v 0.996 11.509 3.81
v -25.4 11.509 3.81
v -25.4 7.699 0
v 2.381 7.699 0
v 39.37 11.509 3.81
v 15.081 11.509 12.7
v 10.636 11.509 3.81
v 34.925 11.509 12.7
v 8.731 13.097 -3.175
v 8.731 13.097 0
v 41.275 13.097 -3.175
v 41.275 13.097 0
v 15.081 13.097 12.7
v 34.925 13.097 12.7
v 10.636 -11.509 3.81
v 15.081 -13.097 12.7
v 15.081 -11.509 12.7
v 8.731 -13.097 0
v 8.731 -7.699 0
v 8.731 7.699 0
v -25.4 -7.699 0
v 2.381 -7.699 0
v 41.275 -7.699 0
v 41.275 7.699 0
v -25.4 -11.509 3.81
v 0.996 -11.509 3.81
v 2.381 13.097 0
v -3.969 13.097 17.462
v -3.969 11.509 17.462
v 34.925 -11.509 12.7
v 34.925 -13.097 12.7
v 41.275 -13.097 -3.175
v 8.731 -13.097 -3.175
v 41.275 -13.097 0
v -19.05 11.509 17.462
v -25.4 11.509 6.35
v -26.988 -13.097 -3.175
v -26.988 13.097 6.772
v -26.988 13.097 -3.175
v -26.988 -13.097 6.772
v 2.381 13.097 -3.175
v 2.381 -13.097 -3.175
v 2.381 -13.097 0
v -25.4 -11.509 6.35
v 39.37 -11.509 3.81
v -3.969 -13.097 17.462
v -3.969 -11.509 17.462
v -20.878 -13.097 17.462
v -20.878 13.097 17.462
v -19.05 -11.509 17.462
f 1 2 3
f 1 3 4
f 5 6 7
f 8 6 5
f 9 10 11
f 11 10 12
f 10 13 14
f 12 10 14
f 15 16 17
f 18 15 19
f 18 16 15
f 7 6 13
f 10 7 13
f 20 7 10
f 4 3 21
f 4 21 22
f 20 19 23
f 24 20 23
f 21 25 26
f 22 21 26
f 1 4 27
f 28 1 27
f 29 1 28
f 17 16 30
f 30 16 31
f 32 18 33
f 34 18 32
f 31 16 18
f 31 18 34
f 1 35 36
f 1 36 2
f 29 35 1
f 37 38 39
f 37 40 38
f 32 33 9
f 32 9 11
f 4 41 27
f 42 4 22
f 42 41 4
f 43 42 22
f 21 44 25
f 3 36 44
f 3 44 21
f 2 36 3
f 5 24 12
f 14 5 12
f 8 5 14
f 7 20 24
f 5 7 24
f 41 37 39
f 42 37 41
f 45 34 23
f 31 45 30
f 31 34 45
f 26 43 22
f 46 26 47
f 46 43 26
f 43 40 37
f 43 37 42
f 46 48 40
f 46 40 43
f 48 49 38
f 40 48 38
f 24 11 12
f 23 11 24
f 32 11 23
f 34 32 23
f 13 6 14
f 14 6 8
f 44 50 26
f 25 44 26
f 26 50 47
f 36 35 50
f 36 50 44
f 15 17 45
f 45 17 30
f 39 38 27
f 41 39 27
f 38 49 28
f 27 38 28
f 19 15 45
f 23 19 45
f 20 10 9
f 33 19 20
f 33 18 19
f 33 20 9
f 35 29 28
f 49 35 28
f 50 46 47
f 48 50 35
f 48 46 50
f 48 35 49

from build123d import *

# Parameters (mm, degrees)
F0_W      = 15.08125
F0_H      = 17.4625
F1_DEPTH  = 13.096875
F0_W_2    = 19.84375
F0_H_2    = 12.7
F2_DEPTH  = 11.509375
F3_SIZE   = 3.81
F3_2_SIZE = 3.81


# Not quite as in the source:
# - a feature names something its author has since deleted; it is built from what else it names


with BuildPart() as f1:
    # F0 (on Front) → F1 (new body, symmetric)
    with BuildSketch(Plane.XZ):
        Polygon((-25.4000246501, 0), (-19.0500246501, 0), (-19.0500246501, 17.4625), (-25.4000246501, 6.35), align=None)
        Polygon((-3.9687746501, 0), (2.3812253499, 0), (-3.9687746501, 17.4625), align=None)
        Polygon((-26.9875246501, -3.175), (-25.4000246501, -3.175), (-25.4000246501, 0), (-25.4000246501, 6.35), (-19.0500246501, 17.4625), (-20.8784295323, 17.4625), (-26.9875246501, 6.7715835439), (-26.9875246501, 6.35), align=None)
        with Locations((-11.5093996501, 8.73125)):
            Rectangle(F0_W, F0_H)
        Polygon((2.3812253499, -3.175), (2.3812253499, 0), (-3.9687746501, 0), (-19.0500246501, 0), (-25.4000246501, 0), (-25.4000246501, -3.175), align=None)
    extrude(amount=F1_DEPTH, both=True)


with BuildPart() as f1b:
    # F0 (on Front) → F1, piece 2 (new body, symmetric)
    with BuildSketch(Plane.XZ):
        Polygon((8.7312253499, 0), (15.0812253499, 0), (15.0812253499, 12.7), align=None)
        Polygon((34.9249753499, 0), (41.2749753499, 0), (34.9249753499, 12.7), align=None)
        Polygon((41.2749753499, -3.175), (41.2749753499, 0), (34.9249753499, 0), (15.0812253499, 0), (8.7312253499, 0), (8.7312253499, -3.175), align=None)
        with Locations((25.0031003499, 6.35)):
            Rectangle(F0_W_2, F0_H_2)
    extrude(amount=F1_DEPTH, both=True)


with BuildPart() as f2_tool:
    # F0 (on Front) → F2 (new body, symmetric)
    with BuildSketch(Plane.XZ):
        Polygon((-25.4000246501, 0), (-19.0500246501, 0), (-19.0500246501, 17.4625), (-25.4000246501, 6.35), align=None)
        with Locations((-11.5093996501, 8.73125)):
            Rectangle(F0_W, F0_H)
        Polygon((-3.9687746501, 0), (2.3812253499, 0), (-3.9687746501, 17.4625), align=None)
        with Locations((25.0031003499, 6.35)):
            Rectangle(F0_W_2, F0_H_2)
        Polygon((8.7312253499, 0), (15.0812253499, 0), (15.0812253499, 12.7), align=None)
        Polygon((34.9249753499, 0), (41.2749753499, 0), (34.9249753499, 12.7), align=None)
    extrude(amount=F2_DEPTH, both=True)


with BuildPart() as f1_1:
    add(f1.part)

    # F2: cut by f2_tool
    add(f2_tool.part, mode=Mode.SUBTRACT)

    # F3
    f3_edges = [f1_1.edges().sort_by_distance(p)[0] for p in [
        (-11.5094, -11.509375, 0),
        (-11.5094, 11.509375, 0),
    ]]
    chamfer(f3_edges, length=F3_SIZE)


with BuildPart() as f1b_1:
    add(f1b.part)

    # F2: cut by f2_tool
    add(f2_tool.part, mode=Mode.SUBTRACT)

    # F3#2
    f3_2_edges = [f1b_1.edges().sort_by_distance(p)[0] for p in [
        (25.0031, 11.509375, 0),
        (25.0031, -11.509375, 0),
    ]]
    chamfer(f3_2_edges, length=F3_2_SIZE)


solid = Compound([f1_1.part, f1b_1.part])
